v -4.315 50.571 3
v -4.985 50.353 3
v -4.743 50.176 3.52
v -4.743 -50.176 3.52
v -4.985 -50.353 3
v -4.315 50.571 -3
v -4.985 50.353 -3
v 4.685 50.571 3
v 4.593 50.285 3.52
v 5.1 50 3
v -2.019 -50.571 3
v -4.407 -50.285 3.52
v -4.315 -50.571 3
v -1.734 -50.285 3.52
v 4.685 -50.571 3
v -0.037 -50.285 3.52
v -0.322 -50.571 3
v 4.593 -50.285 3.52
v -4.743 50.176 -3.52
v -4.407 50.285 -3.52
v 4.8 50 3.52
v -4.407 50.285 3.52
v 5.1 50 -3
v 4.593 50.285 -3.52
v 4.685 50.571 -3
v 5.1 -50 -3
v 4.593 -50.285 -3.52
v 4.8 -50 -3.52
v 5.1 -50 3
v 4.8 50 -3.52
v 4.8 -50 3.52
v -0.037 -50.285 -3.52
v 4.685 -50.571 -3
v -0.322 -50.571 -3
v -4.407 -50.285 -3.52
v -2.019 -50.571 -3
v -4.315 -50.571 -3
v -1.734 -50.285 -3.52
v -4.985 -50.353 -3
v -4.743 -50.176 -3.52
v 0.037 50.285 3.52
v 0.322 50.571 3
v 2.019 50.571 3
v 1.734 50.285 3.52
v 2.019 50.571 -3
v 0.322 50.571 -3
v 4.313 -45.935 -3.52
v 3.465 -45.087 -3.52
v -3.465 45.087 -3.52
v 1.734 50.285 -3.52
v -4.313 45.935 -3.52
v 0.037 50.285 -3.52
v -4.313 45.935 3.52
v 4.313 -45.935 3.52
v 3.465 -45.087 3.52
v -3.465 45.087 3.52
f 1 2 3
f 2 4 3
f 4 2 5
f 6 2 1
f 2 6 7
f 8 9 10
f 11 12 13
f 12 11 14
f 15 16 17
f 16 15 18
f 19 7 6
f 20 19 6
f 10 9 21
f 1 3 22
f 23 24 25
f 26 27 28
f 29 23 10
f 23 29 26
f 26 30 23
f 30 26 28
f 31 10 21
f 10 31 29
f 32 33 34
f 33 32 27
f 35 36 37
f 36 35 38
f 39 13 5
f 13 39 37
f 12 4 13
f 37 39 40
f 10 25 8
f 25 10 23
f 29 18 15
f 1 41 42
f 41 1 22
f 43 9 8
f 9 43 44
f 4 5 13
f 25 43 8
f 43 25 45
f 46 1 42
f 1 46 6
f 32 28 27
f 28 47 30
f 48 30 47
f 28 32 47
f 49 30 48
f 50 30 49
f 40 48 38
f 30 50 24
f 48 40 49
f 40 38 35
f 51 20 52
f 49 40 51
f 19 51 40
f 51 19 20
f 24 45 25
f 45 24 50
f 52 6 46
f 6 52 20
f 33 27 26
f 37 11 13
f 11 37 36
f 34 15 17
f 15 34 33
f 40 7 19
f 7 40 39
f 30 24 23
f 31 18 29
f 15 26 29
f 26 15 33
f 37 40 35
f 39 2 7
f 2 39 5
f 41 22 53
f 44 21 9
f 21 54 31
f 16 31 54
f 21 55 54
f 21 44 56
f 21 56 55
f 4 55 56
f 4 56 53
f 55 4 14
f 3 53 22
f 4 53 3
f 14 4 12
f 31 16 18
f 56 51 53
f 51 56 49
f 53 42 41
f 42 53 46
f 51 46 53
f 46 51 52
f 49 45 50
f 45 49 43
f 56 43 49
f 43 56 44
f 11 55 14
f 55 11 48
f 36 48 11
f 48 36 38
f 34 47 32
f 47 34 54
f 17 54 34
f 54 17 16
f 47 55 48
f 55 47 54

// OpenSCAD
// Parameters
rail_length = 100; //[50:200:1]
rail_width = 9; //[5:18:0.5]
rail_height = 6; //[3:12:0.5]
edge_fillet_radius = 0.6; //[0.2:1.2:0.1]
chamfer_length = 1.2; //[0.5:3:0.1]
connect_overlap = 1; //[0.5:2:0.1]

// Rail Body
module rail_body() {
  cube([rail_width, rail_length, rail_height], center=true);
}

// Edge Fillets
module edge_fillets_sphere() {
  sphere(r=edge_fillet_radius, center=true);
}

// End Chamfer Cut
module end_chamfer_cut() {
  cube([rail_width + 2*connect_overlap, chamfer_length, rail_height + 2*connect_overlap], center=true);
}

// Rail with Edge Fillets
module rail_with_edge_fillets() {
  minkowski() {
    rail_body();
    edge_fillets_sphere();
  }
}

// Rail with End Chamfers
module rail_with_end_chamfers() {
  difference() {
    rail_with_edge_fillets();
    translate([0, rail_length/2 - chamfer_length/2, 0])
      rotate([0, 0, 45]) end_chamfer_cut();
    translate([0, -rail_length/2 + chamfer_length/2, 0])
      rotate([0, 0, 45]) end_chamfer_cut();
  }
}

// Final Rail
module rail_complete() {
  union() {
    rail_with_end_chamfers();
    // Placeholder for mounting holes and engraved markings
    // Currently no geometry for these, as per plan
  }
}

// Render the final rail
color("Silver") rail_complete();
